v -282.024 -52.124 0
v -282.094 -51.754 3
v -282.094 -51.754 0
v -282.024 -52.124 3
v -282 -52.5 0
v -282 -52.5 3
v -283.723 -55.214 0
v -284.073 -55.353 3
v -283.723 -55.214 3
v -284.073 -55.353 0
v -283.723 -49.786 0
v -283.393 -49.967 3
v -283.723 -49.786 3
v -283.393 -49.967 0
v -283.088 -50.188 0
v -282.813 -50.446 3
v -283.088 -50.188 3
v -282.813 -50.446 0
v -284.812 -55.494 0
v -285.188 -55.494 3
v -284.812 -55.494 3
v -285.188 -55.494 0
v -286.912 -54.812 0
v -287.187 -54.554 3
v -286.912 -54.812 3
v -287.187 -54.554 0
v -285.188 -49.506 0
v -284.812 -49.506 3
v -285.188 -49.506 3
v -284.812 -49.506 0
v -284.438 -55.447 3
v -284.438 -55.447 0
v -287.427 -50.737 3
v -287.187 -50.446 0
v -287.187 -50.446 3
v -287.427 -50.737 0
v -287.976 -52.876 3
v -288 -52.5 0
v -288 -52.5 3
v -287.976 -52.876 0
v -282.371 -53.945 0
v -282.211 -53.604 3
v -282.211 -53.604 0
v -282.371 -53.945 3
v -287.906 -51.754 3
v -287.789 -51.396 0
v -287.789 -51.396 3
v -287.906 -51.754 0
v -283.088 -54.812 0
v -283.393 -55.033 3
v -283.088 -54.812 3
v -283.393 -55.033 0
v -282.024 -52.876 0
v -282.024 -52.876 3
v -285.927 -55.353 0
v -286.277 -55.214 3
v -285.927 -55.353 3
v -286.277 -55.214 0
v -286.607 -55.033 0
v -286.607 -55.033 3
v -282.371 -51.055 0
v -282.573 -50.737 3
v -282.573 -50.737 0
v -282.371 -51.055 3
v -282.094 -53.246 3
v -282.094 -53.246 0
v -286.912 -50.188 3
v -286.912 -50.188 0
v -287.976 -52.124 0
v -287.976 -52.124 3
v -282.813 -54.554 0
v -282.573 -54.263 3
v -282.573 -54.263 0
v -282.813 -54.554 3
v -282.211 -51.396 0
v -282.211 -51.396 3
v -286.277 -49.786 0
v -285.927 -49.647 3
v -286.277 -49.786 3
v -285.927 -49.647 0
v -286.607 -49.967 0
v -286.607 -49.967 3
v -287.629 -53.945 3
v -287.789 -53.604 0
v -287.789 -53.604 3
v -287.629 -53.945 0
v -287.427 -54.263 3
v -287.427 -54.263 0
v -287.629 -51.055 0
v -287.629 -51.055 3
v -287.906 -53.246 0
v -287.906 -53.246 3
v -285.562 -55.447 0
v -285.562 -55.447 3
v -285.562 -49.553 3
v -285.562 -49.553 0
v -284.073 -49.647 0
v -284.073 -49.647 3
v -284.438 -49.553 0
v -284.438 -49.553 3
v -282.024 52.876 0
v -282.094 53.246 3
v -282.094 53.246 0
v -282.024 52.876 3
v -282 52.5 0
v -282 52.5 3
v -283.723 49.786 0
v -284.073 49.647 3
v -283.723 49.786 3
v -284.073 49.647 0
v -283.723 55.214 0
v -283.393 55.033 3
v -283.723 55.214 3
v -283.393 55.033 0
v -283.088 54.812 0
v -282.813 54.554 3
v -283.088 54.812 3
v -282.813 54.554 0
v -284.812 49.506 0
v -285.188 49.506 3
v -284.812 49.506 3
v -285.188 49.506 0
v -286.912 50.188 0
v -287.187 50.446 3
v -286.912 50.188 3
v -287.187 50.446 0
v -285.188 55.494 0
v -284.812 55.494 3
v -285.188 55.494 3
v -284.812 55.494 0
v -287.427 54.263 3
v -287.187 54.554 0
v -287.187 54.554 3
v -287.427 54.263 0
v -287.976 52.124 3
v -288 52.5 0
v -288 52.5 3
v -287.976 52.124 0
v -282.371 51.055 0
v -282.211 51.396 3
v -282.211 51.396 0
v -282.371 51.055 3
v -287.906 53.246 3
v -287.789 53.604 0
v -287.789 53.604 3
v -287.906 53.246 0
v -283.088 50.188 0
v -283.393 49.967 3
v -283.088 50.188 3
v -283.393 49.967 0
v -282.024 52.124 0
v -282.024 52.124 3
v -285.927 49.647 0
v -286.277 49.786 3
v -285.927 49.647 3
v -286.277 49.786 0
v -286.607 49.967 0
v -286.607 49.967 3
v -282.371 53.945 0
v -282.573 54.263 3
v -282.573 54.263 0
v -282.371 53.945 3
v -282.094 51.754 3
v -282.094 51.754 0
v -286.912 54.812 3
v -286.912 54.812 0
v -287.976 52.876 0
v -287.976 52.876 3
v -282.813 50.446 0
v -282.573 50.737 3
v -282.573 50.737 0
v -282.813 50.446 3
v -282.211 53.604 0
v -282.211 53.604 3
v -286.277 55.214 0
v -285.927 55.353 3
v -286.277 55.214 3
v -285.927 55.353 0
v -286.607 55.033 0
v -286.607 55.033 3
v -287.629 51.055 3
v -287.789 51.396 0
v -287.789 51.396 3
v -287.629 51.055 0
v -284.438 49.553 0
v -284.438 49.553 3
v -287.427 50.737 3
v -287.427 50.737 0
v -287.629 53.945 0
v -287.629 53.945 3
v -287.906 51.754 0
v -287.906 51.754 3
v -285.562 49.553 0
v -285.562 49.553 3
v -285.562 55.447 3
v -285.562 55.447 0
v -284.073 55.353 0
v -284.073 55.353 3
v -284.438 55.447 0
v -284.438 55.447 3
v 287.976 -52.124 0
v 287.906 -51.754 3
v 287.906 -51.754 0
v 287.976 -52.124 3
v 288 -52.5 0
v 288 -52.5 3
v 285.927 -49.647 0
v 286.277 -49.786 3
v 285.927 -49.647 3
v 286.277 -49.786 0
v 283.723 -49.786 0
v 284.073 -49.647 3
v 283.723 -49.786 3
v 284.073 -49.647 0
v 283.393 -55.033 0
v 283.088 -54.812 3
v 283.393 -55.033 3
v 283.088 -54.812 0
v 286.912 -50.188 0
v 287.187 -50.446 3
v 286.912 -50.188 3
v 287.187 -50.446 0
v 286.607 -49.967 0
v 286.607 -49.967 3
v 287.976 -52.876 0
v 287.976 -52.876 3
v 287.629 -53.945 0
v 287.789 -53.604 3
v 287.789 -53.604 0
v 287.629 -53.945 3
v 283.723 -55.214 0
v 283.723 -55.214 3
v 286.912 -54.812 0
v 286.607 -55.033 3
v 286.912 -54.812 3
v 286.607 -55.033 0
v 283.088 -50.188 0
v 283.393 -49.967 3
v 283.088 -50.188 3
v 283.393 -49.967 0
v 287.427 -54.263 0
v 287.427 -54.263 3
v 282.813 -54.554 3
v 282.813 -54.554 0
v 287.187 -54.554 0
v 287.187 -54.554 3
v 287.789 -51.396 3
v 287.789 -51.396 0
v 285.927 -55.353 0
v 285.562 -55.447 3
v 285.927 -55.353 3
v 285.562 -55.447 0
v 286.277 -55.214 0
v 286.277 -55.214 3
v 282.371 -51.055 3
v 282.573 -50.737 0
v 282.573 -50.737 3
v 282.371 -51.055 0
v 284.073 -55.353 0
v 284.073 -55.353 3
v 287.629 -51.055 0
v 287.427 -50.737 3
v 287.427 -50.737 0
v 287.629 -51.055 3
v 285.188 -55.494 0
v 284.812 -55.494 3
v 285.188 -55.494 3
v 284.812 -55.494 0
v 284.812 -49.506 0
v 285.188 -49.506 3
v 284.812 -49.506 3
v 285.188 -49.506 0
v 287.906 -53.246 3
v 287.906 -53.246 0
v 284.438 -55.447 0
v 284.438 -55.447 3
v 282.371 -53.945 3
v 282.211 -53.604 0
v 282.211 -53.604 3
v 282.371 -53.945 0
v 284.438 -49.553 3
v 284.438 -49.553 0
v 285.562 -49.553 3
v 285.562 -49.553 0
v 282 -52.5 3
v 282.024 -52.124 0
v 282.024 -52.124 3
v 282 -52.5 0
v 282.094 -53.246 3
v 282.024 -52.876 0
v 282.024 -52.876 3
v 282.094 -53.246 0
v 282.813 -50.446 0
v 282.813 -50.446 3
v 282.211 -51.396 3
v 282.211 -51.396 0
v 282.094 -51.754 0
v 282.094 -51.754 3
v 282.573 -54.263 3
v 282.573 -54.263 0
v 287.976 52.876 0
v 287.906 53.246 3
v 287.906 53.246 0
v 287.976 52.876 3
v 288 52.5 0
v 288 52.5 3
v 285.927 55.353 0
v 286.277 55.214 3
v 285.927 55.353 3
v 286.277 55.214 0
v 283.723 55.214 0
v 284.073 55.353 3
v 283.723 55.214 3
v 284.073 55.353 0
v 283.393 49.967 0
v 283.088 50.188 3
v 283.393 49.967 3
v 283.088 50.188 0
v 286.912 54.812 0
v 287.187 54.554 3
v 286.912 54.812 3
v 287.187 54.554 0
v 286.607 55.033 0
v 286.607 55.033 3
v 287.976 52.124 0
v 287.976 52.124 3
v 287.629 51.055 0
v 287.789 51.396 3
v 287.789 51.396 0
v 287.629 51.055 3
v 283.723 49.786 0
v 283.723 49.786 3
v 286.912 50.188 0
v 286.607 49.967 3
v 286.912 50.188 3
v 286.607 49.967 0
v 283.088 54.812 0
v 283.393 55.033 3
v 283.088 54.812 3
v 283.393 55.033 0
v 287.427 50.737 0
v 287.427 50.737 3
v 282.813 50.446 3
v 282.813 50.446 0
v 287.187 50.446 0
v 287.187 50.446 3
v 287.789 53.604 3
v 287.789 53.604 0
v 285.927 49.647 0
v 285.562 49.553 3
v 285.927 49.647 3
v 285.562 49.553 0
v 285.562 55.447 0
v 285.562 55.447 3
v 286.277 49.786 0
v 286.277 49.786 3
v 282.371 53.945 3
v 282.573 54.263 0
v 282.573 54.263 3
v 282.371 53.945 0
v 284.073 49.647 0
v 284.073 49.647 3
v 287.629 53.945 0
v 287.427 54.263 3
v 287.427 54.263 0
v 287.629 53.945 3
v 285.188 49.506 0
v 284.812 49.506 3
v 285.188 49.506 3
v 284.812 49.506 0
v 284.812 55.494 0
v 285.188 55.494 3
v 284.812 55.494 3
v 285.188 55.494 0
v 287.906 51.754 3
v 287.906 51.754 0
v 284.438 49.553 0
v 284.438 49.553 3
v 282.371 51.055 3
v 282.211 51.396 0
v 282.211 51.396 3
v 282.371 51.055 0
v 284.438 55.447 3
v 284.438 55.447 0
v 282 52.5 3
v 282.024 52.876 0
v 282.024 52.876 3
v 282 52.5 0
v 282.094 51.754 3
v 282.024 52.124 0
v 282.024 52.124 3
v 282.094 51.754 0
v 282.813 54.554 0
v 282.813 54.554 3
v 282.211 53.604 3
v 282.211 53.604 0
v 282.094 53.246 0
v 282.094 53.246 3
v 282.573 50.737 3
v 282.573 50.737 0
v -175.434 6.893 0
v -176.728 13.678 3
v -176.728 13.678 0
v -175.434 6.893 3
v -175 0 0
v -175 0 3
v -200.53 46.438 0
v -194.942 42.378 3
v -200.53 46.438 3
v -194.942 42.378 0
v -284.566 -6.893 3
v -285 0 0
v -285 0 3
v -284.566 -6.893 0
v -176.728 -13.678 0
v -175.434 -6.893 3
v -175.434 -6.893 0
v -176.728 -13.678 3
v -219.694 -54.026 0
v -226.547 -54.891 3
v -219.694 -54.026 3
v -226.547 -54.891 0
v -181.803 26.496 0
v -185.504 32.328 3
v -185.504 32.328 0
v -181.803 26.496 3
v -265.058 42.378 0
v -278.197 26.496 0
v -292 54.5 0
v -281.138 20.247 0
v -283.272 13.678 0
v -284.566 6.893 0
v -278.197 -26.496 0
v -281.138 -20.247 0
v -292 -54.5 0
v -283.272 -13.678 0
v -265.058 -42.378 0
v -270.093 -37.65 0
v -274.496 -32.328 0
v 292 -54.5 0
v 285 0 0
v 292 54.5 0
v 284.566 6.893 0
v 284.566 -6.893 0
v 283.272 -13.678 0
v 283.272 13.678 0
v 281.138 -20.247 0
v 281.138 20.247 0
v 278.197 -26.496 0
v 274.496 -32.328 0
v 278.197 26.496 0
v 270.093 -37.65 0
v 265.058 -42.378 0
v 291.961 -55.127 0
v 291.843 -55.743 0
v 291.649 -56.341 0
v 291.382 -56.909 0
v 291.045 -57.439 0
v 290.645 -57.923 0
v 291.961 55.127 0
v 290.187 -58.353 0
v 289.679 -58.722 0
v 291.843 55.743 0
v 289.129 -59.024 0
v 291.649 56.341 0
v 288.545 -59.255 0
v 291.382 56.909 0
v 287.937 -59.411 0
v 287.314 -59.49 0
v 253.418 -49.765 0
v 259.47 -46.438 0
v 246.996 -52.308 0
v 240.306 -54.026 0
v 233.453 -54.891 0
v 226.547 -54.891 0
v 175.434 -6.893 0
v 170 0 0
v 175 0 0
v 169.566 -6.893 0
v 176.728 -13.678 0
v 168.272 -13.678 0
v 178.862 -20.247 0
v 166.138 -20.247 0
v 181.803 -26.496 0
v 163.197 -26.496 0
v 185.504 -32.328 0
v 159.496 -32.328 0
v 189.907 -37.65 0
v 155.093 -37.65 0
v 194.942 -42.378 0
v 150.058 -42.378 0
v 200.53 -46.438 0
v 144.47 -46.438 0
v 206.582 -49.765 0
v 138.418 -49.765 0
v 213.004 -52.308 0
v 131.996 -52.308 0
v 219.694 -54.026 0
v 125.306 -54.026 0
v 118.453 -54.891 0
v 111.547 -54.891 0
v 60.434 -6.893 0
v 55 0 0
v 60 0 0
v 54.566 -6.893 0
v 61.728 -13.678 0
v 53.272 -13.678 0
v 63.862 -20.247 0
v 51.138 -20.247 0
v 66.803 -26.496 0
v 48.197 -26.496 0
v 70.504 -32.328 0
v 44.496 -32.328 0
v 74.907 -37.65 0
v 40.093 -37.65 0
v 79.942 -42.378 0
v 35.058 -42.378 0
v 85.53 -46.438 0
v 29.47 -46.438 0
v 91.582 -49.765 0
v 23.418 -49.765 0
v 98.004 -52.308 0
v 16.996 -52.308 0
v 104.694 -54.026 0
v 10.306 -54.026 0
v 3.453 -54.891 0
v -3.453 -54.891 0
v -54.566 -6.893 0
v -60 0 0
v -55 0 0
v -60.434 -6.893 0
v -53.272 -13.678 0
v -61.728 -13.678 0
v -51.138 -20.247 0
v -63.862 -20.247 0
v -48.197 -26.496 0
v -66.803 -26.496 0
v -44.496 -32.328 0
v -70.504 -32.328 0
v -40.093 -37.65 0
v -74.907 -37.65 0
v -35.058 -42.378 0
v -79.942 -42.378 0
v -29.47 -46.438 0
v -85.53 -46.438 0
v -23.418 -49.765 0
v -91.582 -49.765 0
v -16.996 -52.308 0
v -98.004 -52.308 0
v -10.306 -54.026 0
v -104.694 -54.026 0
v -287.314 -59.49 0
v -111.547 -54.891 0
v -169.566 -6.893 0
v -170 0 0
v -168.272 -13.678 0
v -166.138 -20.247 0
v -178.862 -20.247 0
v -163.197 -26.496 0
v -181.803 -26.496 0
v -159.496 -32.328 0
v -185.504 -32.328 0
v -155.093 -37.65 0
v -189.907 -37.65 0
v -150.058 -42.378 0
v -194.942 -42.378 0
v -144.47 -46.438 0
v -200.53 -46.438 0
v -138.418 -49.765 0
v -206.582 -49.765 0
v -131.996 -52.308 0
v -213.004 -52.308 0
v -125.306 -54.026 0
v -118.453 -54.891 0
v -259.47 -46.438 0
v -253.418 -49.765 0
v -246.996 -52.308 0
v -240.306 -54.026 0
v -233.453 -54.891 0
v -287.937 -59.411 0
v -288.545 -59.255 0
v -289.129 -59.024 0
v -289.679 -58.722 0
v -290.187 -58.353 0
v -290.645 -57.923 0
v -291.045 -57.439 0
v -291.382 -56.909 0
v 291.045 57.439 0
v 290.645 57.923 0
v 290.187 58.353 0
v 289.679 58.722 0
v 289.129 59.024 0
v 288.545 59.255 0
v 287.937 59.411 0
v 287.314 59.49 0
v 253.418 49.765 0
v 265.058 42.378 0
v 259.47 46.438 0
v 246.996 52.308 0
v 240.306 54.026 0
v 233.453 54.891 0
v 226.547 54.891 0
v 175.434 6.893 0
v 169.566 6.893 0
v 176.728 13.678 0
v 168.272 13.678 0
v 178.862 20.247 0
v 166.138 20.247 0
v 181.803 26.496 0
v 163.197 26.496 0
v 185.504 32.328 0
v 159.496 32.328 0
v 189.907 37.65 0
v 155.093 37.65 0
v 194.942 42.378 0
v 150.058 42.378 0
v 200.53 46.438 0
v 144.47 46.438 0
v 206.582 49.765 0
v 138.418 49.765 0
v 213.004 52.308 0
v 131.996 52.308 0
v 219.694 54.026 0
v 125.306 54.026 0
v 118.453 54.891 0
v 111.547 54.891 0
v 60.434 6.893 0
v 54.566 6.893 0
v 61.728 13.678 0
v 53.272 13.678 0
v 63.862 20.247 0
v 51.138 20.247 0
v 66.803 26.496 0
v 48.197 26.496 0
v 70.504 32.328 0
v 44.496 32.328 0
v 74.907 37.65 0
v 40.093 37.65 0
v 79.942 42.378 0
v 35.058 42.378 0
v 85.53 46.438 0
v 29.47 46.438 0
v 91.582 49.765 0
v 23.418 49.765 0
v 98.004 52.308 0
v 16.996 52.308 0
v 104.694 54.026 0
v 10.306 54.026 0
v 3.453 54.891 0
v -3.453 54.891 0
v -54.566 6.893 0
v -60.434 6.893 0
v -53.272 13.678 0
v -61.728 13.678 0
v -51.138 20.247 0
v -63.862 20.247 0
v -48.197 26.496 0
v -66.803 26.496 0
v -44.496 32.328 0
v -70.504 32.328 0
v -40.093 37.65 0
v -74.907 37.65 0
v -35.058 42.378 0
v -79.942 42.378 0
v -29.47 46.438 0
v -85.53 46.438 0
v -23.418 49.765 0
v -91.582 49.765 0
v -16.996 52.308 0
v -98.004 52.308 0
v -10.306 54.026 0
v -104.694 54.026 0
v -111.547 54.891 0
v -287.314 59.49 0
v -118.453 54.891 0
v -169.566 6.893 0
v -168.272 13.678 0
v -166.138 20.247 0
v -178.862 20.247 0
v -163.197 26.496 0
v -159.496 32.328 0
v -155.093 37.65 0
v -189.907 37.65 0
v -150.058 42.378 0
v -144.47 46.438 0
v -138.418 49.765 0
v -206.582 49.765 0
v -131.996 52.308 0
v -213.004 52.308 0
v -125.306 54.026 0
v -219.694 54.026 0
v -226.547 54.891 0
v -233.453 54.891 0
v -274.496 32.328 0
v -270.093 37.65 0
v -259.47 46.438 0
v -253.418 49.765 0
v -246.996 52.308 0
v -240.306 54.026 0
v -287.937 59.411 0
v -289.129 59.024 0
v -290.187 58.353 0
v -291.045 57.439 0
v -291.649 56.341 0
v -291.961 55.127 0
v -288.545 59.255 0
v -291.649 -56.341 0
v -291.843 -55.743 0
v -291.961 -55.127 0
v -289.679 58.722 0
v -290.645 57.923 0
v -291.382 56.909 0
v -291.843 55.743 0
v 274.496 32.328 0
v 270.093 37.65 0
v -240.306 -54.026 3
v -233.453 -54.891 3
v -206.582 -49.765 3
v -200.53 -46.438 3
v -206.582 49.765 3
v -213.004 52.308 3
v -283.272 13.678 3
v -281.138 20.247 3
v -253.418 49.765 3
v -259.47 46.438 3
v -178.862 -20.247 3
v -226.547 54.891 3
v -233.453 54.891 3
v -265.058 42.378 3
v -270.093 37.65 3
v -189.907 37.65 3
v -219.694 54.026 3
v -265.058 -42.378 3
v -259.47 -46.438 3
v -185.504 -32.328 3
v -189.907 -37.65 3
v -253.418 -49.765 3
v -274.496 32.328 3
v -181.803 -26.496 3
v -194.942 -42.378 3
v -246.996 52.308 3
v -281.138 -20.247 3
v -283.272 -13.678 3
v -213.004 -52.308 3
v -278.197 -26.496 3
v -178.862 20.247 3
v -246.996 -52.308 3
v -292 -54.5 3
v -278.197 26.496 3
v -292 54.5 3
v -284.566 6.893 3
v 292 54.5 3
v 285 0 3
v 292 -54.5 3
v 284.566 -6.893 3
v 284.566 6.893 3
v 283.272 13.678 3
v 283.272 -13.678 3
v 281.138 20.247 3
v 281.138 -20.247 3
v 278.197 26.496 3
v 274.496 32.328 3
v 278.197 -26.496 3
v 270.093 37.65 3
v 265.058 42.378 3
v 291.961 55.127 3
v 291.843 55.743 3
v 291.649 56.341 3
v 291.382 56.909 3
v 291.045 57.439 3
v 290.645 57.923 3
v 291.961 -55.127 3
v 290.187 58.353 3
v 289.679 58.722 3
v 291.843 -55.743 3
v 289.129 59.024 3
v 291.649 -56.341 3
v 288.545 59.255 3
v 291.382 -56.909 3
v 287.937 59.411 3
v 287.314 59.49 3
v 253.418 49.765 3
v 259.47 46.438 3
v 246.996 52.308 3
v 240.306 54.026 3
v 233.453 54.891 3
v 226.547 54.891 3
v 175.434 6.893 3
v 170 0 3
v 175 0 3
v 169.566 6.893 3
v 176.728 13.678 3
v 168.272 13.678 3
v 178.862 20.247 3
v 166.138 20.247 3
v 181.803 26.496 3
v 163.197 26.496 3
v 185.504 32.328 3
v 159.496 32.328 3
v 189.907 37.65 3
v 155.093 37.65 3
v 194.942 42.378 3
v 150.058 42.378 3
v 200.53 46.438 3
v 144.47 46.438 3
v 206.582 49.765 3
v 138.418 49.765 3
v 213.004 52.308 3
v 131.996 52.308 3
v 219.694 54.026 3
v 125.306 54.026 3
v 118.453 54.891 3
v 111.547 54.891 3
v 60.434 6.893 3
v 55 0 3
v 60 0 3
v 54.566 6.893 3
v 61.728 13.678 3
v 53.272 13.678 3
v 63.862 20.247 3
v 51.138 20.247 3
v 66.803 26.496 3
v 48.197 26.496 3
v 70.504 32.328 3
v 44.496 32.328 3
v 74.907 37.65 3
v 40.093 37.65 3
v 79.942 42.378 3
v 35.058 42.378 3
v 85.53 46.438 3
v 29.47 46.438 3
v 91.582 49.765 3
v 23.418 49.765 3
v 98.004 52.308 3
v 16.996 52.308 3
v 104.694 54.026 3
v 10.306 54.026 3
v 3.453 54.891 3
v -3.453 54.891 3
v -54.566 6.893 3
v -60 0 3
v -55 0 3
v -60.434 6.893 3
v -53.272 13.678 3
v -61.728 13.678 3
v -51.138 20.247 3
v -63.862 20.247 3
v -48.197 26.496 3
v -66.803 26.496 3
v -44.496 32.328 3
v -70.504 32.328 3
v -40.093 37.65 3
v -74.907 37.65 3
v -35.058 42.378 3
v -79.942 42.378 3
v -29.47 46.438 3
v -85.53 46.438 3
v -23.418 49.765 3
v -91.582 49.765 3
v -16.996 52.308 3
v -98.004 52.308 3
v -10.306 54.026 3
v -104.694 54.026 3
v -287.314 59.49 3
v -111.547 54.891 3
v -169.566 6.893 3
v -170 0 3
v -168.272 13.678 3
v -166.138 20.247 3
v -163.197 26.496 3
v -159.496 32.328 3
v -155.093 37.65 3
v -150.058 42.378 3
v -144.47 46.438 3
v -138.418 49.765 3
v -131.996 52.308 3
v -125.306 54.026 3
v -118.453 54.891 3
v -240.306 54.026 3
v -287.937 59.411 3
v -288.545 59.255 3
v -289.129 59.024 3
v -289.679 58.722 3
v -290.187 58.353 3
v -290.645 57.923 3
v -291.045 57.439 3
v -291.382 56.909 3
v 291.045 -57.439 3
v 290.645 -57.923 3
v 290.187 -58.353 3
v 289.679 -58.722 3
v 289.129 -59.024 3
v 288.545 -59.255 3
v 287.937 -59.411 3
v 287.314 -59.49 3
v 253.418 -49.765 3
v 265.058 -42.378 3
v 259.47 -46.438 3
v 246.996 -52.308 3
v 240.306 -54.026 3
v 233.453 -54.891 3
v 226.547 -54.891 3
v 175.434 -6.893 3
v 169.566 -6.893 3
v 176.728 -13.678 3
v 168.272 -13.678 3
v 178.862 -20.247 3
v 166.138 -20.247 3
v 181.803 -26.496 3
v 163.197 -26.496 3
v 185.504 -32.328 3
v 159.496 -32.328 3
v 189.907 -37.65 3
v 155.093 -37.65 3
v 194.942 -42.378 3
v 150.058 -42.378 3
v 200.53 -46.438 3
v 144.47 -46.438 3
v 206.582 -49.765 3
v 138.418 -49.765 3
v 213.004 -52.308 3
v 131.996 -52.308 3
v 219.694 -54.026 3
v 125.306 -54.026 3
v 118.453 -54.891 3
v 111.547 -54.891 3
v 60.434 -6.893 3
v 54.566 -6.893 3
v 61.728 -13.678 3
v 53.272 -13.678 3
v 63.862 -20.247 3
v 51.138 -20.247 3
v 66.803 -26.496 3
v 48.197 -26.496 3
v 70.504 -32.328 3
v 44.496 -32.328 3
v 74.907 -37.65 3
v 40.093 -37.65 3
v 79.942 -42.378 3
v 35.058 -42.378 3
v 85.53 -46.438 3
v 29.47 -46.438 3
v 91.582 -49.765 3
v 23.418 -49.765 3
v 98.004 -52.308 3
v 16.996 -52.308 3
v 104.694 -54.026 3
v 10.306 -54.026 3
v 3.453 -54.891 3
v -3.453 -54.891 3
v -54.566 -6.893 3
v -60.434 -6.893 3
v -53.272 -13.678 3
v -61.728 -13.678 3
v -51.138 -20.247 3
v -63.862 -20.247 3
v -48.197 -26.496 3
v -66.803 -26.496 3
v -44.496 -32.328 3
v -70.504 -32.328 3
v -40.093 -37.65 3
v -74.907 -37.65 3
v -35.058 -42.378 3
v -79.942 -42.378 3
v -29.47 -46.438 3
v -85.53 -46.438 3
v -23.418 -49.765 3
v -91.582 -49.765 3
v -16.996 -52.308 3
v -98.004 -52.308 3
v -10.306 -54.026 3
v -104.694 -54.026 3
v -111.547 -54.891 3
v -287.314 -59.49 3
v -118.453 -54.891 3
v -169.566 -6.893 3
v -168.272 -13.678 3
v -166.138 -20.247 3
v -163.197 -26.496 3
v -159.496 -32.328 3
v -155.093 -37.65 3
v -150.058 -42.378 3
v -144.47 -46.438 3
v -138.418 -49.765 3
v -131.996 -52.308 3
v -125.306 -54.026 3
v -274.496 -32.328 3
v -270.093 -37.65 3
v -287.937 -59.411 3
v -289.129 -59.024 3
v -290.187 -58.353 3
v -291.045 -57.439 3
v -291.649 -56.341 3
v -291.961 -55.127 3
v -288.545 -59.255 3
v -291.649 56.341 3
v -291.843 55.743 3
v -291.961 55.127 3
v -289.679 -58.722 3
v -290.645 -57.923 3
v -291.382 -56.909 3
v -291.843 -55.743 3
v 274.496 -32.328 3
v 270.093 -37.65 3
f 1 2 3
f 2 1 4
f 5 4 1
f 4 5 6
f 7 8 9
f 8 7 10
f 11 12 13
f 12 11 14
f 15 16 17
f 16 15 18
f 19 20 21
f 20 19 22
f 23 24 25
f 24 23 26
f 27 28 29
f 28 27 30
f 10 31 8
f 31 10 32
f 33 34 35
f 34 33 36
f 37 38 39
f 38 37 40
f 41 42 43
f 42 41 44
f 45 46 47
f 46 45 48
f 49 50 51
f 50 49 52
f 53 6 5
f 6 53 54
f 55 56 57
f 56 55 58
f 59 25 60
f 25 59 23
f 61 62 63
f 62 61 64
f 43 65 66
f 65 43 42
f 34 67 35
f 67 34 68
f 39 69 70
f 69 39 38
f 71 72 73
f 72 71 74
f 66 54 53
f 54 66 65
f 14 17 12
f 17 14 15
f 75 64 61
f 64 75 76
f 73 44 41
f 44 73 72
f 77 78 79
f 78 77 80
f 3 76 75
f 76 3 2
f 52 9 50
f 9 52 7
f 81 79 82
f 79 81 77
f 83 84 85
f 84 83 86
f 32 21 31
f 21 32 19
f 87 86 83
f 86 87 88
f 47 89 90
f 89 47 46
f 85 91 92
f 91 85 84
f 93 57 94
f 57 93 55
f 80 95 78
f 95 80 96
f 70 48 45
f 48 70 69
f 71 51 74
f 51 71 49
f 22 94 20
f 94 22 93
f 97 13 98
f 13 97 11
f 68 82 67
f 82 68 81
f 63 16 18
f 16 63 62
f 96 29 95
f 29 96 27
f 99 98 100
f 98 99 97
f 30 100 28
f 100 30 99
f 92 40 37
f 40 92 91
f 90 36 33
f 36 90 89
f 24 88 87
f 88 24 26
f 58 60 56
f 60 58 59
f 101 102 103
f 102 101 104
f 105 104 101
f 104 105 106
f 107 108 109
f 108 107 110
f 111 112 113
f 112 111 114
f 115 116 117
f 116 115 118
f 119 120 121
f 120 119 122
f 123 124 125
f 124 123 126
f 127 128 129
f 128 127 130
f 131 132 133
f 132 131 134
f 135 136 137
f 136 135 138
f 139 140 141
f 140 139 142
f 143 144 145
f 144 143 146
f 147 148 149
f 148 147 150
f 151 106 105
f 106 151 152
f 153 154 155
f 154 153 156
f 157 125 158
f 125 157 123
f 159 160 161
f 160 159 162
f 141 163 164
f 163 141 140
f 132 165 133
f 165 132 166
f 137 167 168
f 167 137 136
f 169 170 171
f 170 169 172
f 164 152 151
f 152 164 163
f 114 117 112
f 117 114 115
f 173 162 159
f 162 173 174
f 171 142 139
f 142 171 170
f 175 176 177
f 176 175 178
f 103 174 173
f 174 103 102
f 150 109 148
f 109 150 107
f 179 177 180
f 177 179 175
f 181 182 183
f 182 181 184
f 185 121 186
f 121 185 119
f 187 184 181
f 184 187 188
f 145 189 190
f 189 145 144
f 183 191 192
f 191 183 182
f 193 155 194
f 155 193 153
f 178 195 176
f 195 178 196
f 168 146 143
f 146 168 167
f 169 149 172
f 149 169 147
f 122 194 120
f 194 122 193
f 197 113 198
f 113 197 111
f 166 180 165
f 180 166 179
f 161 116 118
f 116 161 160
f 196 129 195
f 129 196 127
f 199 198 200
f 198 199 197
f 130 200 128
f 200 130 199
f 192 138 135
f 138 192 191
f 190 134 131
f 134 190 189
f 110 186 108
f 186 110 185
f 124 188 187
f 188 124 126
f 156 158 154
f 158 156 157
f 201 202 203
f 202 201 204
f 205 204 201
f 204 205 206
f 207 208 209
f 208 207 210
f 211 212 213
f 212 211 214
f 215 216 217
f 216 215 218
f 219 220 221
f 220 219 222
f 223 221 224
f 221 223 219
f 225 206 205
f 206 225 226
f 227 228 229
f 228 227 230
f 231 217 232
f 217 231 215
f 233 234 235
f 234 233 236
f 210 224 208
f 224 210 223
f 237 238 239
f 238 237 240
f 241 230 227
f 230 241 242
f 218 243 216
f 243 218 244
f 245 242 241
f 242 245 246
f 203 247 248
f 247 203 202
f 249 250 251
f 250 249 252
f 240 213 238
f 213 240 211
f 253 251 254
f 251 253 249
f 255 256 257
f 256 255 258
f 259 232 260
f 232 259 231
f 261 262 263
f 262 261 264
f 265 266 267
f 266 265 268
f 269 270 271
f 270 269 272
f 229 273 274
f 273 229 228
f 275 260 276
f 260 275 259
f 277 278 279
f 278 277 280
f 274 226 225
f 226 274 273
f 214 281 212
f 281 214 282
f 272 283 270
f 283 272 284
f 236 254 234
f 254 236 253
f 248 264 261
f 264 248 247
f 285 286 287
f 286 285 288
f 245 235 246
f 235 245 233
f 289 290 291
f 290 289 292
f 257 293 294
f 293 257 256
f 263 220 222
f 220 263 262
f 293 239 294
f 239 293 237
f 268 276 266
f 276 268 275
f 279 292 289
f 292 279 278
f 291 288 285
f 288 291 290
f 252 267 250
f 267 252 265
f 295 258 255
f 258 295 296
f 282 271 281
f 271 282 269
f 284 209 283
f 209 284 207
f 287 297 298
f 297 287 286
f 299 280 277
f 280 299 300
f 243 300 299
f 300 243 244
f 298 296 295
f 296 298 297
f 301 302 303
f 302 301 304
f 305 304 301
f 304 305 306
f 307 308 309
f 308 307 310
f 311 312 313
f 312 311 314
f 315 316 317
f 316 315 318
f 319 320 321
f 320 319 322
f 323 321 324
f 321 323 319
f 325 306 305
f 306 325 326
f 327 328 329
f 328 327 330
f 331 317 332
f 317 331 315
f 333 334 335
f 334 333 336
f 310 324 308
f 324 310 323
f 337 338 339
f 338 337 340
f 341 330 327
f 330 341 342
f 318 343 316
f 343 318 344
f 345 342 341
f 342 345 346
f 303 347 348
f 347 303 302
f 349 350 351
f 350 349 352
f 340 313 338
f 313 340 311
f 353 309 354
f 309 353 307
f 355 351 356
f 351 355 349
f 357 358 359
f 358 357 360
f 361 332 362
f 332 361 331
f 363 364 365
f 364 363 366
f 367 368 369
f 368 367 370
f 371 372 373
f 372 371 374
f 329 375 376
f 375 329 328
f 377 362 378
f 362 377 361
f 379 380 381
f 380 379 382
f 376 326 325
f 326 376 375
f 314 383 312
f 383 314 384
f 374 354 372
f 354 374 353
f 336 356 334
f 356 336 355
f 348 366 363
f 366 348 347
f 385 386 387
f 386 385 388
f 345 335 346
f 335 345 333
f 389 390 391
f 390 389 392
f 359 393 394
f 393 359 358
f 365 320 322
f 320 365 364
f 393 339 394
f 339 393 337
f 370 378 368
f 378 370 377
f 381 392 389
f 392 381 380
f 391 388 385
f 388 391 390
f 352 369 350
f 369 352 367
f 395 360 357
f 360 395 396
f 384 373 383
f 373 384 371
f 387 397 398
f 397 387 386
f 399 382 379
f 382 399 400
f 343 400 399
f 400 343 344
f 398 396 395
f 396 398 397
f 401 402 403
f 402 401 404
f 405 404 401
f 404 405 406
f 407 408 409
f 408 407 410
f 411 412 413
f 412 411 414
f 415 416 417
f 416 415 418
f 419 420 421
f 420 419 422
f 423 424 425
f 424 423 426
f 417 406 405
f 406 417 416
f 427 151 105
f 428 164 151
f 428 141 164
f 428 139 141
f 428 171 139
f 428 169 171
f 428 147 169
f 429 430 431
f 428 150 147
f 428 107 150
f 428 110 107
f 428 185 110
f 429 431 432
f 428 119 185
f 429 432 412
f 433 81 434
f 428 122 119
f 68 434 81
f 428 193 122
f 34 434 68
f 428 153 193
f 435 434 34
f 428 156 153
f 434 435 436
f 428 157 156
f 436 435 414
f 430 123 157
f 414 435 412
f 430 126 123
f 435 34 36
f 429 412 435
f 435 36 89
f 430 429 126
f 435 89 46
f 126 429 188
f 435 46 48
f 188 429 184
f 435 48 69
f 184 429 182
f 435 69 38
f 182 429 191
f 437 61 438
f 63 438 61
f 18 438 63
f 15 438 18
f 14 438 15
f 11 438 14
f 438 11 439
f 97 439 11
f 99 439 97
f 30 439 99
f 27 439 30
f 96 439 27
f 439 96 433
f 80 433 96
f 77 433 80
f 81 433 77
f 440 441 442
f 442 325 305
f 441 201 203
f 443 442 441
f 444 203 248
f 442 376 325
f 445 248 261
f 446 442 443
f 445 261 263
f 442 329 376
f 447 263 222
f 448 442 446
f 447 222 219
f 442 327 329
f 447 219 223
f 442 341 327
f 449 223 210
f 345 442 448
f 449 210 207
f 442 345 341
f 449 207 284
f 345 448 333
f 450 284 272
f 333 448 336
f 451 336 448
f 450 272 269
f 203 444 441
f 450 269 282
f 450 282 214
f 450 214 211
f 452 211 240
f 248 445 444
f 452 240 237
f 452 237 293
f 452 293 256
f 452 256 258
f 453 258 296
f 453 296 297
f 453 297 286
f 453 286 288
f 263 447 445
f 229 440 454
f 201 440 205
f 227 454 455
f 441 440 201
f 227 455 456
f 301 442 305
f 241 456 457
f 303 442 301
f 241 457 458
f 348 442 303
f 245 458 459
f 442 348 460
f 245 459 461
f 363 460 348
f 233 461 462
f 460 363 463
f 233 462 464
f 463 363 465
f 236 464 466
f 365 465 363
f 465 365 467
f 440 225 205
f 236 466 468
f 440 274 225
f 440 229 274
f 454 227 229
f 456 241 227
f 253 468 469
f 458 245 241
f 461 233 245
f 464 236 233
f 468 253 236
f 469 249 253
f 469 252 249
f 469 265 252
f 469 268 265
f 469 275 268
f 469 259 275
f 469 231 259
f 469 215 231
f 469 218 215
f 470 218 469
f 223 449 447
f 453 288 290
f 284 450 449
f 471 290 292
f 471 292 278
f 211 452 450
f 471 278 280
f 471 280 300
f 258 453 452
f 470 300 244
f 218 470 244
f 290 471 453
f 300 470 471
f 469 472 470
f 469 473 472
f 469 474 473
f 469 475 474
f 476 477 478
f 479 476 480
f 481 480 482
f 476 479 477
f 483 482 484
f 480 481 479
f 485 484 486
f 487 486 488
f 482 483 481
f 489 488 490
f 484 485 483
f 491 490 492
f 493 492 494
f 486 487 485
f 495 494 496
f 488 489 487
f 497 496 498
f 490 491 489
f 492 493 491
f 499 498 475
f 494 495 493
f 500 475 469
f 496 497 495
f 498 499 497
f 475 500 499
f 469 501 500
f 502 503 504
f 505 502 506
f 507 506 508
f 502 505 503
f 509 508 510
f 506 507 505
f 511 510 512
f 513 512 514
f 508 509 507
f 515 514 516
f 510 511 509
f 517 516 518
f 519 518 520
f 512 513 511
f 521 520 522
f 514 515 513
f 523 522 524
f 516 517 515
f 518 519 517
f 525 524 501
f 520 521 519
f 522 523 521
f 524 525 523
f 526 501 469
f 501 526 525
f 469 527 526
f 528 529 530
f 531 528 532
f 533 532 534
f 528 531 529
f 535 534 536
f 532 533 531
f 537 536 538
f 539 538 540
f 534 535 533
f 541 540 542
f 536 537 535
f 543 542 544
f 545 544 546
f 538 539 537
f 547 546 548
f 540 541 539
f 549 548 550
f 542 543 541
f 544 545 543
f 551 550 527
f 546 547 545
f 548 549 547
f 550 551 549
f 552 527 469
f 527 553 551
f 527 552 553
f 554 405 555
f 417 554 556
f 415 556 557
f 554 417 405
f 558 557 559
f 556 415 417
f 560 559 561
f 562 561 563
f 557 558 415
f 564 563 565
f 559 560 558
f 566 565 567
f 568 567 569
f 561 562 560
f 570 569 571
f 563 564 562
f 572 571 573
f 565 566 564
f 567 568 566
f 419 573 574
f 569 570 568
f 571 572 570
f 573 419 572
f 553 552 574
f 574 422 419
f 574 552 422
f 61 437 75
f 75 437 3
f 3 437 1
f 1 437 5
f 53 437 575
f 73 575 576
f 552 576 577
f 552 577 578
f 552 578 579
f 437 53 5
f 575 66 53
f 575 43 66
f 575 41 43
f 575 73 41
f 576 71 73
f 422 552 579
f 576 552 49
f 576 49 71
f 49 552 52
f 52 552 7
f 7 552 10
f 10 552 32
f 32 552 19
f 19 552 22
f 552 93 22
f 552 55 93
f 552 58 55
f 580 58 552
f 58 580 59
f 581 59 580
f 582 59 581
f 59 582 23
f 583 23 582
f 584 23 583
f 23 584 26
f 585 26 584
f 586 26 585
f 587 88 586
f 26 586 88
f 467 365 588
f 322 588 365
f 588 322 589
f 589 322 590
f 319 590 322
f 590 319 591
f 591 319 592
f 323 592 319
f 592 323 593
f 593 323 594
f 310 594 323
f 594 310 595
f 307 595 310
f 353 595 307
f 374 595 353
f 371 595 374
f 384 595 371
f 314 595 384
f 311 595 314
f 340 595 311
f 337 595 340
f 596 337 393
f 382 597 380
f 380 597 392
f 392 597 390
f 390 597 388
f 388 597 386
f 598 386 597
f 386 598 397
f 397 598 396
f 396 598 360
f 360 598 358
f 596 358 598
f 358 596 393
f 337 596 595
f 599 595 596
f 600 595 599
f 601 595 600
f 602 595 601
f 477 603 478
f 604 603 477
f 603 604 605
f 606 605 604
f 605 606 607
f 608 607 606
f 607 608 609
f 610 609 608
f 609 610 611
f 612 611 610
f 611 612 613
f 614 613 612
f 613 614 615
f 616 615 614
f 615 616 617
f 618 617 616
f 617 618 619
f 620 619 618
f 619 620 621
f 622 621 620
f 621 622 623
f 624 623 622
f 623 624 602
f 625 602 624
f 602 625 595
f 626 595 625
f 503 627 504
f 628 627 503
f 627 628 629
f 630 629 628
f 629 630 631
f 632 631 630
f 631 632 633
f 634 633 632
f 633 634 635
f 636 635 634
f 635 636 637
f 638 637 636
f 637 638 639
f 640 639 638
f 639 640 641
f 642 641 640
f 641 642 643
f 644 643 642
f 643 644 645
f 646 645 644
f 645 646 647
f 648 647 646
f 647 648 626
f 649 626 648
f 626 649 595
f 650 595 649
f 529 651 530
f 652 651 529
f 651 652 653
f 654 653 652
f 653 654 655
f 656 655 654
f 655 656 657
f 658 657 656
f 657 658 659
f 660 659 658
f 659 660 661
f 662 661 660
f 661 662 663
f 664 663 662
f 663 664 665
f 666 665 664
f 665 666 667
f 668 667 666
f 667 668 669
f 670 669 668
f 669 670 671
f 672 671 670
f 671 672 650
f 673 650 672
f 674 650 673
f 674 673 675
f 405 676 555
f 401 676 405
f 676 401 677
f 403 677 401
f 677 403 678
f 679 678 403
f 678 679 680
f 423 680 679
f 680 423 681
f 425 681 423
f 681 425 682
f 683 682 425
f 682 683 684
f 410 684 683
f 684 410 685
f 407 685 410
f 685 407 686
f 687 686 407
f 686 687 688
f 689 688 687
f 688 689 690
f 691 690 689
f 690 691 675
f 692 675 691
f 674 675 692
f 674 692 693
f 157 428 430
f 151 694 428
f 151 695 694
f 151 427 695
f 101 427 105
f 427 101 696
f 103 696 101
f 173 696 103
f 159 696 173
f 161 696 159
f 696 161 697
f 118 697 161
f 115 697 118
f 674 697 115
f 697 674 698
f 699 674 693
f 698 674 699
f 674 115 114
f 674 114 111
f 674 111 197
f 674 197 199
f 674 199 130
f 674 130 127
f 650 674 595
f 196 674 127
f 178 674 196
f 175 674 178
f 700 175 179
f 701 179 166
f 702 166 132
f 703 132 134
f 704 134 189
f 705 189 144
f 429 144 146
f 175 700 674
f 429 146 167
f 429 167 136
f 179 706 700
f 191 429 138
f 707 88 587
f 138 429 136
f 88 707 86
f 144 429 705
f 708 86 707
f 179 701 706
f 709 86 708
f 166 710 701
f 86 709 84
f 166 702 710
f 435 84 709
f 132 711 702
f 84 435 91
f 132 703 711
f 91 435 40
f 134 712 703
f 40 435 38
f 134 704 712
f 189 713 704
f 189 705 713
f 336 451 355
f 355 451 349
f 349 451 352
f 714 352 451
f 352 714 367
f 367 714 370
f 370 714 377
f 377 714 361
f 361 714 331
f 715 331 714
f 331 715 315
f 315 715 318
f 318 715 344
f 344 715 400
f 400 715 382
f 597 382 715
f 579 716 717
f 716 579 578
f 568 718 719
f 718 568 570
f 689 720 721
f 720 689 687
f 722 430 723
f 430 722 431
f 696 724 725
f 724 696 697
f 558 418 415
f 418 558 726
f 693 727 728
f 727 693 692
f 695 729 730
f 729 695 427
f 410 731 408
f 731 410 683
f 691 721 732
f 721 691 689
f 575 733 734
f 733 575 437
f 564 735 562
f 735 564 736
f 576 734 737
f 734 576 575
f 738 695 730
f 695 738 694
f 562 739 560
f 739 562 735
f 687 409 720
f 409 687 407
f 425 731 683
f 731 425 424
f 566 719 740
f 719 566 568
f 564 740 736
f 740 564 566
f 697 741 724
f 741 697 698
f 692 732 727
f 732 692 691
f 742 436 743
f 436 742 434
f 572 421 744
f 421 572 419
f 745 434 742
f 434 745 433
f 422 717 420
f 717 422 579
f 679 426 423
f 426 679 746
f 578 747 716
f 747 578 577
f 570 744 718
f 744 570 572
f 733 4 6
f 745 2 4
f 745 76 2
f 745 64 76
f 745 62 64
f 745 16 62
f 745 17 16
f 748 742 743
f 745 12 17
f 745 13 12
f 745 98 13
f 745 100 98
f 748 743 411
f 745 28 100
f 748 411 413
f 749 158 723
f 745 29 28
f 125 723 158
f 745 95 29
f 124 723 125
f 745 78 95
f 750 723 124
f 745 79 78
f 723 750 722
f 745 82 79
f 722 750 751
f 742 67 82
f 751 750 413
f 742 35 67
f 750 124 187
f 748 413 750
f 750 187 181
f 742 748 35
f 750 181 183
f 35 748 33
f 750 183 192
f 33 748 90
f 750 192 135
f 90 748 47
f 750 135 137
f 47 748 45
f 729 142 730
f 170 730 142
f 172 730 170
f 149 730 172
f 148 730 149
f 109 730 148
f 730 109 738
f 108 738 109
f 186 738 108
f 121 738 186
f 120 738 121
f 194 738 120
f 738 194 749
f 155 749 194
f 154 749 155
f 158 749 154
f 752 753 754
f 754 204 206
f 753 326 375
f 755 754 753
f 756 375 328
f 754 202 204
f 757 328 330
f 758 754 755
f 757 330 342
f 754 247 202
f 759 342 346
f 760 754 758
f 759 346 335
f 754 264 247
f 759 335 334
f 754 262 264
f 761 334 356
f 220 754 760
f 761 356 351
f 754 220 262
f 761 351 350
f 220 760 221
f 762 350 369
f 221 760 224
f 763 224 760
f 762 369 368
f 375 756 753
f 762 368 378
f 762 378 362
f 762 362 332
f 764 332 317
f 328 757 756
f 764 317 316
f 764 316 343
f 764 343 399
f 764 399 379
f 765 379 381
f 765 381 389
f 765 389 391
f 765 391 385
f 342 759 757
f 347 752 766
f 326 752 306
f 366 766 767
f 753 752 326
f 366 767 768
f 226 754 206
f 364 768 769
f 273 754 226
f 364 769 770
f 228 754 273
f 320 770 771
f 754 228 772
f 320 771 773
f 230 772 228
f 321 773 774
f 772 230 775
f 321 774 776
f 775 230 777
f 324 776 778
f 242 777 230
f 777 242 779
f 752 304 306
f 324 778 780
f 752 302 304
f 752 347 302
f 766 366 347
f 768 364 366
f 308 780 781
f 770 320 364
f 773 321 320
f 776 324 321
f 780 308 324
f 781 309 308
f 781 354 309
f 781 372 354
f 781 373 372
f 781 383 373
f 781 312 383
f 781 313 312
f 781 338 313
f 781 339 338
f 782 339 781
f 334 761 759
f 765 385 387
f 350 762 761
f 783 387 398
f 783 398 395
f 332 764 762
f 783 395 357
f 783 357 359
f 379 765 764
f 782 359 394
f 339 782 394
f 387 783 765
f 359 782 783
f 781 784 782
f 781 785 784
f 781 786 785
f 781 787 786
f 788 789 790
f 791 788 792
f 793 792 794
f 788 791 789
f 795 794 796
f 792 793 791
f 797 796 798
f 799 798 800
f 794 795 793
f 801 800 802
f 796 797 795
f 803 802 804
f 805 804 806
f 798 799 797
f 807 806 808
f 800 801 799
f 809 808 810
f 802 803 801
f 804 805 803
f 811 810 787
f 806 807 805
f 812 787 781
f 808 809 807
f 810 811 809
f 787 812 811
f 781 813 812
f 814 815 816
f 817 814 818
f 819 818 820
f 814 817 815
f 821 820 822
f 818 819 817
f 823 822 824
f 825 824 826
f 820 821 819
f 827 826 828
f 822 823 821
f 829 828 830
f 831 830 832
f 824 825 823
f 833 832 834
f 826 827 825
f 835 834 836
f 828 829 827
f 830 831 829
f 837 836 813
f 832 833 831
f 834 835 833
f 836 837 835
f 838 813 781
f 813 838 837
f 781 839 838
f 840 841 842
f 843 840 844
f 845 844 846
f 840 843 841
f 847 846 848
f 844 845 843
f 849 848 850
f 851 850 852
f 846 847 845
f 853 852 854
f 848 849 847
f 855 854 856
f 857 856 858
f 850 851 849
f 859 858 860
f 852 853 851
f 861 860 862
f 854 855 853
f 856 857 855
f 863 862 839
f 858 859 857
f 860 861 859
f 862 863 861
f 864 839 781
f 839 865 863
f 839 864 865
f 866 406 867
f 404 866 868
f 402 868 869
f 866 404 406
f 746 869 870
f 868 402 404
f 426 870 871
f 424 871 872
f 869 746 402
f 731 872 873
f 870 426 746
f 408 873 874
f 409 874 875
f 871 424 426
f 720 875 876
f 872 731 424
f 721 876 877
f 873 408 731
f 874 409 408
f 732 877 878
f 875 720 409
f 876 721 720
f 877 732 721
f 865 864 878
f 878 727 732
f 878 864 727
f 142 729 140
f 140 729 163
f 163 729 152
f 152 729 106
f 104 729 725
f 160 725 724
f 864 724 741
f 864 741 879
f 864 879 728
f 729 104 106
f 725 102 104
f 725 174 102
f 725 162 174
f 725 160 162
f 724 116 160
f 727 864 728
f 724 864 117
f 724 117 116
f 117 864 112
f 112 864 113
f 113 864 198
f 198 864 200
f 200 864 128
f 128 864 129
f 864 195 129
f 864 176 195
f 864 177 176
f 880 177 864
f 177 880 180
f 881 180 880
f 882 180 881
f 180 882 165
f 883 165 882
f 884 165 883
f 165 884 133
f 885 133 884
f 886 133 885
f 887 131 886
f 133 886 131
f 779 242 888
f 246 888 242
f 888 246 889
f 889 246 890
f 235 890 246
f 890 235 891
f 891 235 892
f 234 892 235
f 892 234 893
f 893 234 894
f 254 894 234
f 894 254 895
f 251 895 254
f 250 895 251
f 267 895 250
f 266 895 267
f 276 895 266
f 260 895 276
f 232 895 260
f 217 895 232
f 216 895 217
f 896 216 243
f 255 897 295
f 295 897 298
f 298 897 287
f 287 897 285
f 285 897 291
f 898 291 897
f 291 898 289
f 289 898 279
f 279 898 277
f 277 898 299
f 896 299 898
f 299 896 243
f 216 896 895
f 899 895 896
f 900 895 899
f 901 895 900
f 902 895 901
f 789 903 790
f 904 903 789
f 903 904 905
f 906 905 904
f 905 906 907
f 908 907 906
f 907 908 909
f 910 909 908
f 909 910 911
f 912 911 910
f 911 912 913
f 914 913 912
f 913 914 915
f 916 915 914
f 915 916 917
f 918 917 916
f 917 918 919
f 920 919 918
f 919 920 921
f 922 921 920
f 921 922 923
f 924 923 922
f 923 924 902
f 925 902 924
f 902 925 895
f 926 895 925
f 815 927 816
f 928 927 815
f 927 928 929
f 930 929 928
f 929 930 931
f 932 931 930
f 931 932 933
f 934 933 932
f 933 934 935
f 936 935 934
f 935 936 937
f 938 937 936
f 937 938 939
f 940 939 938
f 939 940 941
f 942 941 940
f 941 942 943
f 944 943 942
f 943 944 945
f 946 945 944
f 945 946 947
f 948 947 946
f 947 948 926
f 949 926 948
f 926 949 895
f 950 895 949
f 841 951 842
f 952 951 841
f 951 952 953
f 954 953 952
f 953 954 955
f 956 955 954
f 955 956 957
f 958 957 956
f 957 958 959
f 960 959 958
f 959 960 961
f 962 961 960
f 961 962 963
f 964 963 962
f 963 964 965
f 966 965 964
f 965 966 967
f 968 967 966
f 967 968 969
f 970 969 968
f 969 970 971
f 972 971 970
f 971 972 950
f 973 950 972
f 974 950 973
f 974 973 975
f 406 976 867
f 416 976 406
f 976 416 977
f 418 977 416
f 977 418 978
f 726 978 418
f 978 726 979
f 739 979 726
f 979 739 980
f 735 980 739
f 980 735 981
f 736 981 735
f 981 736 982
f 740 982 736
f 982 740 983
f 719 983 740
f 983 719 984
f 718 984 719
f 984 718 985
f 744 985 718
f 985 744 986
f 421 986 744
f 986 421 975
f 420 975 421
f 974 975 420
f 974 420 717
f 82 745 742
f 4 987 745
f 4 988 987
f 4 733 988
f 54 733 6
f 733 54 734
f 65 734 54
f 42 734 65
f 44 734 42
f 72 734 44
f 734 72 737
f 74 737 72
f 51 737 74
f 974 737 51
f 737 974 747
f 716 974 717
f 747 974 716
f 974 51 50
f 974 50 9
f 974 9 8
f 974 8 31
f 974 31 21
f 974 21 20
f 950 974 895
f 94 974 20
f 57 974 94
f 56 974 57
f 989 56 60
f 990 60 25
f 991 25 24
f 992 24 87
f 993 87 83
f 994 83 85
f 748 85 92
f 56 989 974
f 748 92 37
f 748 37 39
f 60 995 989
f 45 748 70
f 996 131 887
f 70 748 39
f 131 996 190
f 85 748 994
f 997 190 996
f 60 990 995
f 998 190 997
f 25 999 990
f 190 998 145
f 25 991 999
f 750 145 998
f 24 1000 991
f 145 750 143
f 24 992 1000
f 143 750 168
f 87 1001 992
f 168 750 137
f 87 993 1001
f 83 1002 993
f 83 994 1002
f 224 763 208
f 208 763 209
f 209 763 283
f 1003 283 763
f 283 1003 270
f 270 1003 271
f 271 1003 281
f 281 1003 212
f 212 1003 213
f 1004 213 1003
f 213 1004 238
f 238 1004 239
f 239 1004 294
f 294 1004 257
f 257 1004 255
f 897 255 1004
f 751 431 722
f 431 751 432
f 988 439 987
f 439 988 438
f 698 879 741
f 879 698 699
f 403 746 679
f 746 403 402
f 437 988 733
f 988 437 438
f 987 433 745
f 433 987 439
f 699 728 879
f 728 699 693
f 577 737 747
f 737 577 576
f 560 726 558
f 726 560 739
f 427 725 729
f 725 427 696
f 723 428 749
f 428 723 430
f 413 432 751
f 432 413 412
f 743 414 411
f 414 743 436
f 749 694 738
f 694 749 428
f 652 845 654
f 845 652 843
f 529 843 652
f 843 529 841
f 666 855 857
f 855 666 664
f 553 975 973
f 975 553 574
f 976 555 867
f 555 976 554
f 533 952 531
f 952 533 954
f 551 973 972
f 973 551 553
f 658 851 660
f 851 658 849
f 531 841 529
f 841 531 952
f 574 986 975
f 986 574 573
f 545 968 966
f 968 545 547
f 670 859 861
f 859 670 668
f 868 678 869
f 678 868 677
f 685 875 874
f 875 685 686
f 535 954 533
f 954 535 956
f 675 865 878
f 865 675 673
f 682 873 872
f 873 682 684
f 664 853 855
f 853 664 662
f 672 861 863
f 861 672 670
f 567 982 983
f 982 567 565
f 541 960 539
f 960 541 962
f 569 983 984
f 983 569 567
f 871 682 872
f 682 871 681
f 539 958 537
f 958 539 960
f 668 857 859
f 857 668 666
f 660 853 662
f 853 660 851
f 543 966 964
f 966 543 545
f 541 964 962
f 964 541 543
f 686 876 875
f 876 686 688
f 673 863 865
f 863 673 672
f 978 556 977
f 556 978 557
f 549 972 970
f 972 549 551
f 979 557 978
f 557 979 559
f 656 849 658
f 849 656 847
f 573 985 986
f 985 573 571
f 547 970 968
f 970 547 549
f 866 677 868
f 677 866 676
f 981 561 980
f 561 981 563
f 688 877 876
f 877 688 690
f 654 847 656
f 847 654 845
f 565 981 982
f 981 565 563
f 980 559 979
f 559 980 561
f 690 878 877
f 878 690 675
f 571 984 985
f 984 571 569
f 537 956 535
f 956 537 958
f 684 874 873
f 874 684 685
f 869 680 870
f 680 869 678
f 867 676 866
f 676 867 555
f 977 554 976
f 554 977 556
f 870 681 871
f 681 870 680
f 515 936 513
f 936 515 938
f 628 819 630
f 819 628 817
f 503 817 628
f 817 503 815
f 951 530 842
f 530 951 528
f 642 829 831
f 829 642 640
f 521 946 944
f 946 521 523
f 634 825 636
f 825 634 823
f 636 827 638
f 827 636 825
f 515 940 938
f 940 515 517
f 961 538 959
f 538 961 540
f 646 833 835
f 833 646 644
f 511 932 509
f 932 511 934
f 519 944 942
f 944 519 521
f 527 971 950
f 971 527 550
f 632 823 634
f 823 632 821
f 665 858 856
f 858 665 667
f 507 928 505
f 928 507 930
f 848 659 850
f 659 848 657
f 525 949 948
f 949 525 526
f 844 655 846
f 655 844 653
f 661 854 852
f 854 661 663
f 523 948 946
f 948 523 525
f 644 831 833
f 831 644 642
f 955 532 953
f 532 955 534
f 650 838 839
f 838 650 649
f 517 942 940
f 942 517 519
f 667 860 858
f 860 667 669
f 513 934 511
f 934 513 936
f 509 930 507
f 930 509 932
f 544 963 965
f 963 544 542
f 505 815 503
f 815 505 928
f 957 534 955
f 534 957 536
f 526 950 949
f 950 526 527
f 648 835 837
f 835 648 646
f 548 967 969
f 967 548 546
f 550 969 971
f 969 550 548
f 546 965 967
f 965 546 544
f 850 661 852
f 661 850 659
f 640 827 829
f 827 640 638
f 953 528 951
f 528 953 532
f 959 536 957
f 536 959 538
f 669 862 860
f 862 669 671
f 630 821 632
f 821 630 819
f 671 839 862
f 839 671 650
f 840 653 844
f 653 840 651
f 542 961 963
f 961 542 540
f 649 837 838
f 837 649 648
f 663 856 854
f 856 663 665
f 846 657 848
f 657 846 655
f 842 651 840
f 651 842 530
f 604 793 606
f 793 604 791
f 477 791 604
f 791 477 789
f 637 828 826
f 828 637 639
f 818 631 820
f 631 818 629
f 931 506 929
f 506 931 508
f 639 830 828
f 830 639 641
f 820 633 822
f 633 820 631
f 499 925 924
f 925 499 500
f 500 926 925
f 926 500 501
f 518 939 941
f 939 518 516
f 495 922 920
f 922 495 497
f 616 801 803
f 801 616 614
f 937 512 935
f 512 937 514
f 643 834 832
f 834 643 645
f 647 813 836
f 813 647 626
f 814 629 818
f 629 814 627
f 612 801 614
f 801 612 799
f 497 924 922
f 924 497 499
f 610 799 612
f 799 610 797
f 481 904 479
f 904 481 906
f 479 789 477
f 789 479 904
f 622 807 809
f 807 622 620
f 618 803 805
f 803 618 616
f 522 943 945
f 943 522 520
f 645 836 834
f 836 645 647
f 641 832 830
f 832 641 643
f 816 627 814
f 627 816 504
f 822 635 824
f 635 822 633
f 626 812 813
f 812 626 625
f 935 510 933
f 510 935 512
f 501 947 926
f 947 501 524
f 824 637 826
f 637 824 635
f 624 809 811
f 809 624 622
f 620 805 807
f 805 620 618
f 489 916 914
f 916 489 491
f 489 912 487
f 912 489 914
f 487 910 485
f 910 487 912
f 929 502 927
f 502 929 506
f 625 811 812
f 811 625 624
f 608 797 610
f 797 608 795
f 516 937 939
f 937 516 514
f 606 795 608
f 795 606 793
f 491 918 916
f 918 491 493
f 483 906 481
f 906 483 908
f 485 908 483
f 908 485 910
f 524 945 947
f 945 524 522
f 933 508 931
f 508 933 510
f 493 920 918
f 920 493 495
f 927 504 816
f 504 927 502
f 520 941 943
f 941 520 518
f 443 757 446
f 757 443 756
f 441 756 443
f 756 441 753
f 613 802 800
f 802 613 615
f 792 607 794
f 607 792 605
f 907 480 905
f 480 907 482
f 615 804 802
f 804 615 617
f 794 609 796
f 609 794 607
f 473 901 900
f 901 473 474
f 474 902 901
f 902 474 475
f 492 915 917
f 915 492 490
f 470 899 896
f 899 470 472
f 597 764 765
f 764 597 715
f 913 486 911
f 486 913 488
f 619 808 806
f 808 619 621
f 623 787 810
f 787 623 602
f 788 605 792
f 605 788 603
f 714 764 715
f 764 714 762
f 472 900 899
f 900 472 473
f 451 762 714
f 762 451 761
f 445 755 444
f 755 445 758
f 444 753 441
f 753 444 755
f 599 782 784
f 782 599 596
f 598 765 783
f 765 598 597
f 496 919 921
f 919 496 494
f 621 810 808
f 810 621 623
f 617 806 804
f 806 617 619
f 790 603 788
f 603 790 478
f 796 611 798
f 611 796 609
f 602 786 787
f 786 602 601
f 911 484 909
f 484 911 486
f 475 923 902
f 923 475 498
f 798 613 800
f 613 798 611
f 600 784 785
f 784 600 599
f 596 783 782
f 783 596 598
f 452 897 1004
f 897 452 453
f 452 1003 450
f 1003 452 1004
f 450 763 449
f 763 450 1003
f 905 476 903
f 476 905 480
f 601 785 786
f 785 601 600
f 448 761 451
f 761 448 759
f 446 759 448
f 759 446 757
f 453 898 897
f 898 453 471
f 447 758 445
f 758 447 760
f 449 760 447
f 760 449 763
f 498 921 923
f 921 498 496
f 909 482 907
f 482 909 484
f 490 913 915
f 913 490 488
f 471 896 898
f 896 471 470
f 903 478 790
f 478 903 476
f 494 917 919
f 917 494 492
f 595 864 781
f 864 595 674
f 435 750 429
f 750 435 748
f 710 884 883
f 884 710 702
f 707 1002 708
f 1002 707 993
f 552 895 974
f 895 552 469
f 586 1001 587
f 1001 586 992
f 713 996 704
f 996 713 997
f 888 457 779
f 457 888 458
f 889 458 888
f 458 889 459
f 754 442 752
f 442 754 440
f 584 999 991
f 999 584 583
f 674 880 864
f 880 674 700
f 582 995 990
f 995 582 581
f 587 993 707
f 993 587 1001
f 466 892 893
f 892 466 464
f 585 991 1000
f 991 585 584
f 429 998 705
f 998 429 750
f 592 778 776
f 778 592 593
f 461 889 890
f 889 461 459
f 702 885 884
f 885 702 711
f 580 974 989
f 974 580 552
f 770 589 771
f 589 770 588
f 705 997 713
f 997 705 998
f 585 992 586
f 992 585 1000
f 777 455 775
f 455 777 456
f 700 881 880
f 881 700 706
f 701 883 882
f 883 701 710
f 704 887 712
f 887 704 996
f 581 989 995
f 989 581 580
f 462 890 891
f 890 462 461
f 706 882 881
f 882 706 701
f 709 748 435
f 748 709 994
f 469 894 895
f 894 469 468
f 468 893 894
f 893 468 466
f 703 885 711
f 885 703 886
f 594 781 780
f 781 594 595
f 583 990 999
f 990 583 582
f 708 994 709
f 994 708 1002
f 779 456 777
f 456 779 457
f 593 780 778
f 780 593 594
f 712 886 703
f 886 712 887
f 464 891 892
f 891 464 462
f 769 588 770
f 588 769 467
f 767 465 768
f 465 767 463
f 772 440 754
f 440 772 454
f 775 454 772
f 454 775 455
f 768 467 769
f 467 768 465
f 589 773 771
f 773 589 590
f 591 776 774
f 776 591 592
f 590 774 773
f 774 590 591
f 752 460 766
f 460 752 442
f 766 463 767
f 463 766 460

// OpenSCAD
$fn = 50;


difference() {
	union() {
		hull() {
			translate(v = [-287.0000000000, 54.5000000000, 0]) {
				cylinder(h = 3, r = 5);
			}
			translate(v = [287.0000000000, 54.5000000000, 0]) {
				cylinder(h = 3, r = 5);
			}
			translate(v = [-287.0000000000, -54.5000000000, 0]) {
				cylinder(h = 3, r = 5);
			}
			translate(v = [287.0000000000, -54.5000000000, 0]) {
				cylinder(h = 3, r = 5);
			}
		}
	}
	union() {
		#translate(v = [-285.0000000000, -52.5000000000, -100.0000000000]) {
			cylinder(h = 200, r = 3.0000000000);
		}
		#translate(v = [-285.0000000000, 52.5000000000, -100.0000000000]) {
			cylinder(h = 200, r = 3.0000000000);
		}
		#translate(v = [285.0000000000, -52.5000000000, -100.0000000000]) {
			cylinder(h = 200, r = 3.0000000000);
		}
		#translate(v = [285.0000000000, 52.5000000000, -100.0000000000]) {
			cylinder(h = 200, r = 3.0000000000);
		}
		#translate(v = [-230.0000000000, 0, 0]) {
			cylinder(h = 3, r = 55.0000000000);
		}
		#translate(v = [-115.0000000000, 0, 0]) {
			cylinder(h = 3, r = 55.0000000000);
		}
		#cylinder(h = 3, r = 55.0000000000);
		#translate(v = [115.0000000000, 0, 0]) {
			cylinder(h = 3, r = 55.0000000000);
		}
		#translate(v = [230.0000000000, 0, 0]) {
			cylinder(h = 3, r = 55.0000000000);
		}
	}
}
